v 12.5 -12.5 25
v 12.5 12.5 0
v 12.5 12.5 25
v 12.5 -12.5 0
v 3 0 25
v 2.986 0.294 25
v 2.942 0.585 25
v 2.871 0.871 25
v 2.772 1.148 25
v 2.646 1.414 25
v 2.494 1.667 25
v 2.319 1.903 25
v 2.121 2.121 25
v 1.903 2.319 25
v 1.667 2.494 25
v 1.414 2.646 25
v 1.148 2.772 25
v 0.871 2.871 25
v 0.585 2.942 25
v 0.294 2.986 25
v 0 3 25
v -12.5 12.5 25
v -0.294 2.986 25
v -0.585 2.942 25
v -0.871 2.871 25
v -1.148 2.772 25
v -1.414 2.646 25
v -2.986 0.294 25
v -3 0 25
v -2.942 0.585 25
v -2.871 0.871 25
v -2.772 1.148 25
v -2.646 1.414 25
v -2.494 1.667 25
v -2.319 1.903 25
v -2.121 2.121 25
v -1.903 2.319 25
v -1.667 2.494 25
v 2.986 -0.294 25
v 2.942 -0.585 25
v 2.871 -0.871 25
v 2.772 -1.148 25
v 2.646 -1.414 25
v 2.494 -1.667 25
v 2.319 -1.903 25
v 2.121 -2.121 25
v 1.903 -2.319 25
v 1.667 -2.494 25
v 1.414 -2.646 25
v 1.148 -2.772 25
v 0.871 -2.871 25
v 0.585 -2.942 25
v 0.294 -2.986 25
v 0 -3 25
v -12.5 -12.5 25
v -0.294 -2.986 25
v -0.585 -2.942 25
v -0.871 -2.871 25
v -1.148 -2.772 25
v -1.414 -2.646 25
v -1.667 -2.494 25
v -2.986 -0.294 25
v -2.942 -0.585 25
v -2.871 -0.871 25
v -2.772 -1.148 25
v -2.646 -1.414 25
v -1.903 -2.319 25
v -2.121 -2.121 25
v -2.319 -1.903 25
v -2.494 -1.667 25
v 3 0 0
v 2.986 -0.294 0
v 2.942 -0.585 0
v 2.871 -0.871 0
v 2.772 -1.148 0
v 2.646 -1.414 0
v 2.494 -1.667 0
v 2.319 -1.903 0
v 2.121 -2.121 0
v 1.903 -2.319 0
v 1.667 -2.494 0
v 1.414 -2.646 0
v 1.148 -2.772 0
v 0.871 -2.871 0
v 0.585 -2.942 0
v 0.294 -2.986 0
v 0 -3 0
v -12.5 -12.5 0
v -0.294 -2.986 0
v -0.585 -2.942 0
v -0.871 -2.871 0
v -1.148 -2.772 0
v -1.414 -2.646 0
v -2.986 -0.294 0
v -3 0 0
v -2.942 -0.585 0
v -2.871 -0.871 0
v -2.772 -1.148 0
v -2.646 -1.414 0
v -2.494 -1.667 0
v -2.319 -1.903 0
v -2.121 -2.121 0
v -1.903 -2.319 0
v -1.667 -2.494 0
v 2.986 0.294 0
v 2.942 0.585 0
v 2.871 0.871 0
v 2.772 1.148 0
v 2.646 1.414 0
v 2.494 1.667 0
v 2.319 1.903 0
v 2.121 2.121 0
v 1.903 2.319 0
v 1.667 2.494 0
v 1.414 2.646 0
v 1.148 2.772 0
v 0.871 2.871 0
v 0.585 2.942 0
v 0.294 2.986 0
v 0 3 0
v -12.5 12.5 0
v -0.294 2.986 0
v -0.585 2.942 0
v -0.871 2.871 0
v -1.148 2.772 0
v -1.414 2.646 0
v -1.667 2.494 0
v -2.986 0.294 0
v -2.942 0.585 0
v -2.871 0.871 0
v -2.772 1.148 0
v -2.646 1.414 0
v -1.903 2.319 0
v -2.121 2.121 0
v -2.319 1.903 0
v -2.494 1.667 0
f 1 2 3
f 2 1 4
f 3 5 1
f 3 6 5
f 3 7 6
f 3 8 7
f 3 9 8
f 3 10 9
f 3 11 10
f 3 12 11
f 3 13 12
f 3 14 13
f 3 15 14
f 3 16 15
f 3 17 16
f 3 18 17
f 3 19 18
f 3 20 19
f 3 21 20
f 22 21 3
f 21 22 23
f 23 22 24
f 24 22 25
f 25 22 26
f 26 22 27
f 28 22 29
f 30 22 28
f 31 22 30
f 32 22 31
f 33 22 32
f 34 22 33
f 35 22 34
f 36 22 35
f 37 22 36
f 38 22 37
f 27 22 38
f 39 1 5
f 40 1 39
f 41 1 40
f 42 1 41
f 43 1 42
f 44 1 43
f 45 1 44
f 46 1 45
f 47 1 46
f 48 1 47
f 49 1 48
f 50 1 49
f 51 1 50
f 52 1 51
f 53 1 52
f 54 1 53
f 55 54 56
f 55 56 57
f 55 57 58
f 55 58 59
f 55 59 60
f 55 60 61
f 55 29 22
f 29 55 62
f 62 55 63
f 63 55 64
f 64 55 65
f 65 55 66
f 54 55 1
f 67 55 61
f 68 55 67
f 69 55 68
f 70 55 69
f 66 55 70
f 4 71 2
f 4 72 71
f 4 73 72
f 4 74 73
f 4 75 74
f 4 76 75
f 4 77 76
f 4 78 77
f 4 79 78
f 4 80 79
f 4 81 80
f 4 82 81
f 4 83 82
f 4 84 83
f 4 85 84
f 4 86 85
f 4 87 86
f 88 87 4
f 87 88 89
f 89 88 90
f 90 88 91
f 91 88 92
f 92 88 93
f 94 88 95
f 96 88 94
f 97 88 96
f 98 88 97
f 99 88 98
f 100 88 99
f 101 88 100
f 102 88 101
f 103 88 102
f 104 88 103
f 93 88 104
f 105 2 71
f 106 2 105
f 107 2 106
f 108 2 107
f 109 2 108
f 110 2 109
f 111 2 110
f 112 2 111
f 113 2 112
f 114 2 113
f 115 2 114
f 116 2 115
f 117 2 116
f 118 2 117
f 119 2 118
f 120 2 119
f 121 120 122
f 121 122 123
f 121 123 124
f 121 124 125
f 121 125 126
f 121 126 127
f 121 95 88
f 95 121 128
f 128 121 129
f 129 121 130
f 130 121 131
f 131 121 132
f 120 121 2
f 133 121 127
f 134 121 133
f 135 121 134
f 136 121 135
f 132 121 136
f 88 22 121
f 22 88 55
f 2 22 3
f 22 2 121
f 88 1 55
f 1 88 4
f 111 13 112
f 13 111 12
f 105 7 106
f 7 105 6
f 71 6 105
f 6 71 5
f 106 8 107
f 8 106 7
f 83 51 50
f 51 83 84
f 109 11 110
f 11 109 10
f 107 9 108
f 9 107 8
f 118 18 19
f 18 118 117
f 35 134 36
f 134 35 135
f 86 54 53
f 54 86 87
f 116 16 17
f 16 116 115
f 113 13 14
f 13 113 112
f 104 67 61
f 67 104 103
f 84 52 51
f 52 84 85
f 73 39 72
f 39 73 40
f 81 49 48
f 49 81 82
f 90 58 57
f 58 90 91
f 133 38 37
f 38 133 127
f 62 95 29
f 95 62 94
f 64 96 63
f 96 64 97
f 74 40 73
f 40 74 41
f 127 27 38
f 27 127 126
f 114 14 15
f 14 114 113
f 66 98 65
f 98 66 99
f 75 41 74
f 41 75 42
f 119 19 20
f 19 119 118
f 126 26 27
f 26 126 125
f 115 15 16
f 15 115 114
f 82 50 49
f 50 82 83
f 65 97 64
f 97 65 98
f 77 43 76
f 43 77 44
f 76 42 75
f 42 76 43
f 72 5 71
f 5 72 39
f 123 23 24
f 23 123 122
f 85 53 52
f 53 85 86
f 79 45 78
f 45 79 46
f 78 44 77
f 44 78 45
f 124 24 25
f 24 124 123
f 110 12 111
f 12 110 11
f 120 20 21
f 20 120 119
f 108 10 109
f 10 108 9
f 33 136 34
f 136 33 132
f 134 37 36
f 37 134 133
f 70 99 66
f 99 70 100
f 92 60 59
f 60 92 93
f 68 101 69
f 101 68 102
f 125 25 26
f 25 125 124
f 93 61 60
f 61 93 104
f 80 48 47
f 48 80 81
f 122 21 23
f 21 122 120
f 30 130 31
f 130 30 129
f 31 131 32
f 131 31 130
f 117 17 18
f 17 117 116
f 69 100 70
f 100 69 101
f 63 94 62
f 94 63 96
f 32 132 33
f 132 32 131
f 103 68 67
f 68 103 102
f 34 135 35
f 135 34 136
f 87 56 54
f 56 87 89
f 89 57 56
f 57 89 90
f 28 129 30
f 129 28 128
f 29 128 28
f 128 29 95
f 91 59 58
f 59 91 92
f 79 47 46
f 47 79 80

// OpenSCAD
// Gold reference: 25mm calibration cube, 6mm hole through Z.
// $fn=64 — gold uses smooth curves; voxel pitch makes facet mismatch negligible.
$fn = 64;

size = 25;
hole_d = 6;

difference() {
  translate([-size / 2, -size / 2, 0]) cube([size, size, size]);
  translate([0, 0, -1]) cylinder(d = hole_d, h = size + 2);
}
